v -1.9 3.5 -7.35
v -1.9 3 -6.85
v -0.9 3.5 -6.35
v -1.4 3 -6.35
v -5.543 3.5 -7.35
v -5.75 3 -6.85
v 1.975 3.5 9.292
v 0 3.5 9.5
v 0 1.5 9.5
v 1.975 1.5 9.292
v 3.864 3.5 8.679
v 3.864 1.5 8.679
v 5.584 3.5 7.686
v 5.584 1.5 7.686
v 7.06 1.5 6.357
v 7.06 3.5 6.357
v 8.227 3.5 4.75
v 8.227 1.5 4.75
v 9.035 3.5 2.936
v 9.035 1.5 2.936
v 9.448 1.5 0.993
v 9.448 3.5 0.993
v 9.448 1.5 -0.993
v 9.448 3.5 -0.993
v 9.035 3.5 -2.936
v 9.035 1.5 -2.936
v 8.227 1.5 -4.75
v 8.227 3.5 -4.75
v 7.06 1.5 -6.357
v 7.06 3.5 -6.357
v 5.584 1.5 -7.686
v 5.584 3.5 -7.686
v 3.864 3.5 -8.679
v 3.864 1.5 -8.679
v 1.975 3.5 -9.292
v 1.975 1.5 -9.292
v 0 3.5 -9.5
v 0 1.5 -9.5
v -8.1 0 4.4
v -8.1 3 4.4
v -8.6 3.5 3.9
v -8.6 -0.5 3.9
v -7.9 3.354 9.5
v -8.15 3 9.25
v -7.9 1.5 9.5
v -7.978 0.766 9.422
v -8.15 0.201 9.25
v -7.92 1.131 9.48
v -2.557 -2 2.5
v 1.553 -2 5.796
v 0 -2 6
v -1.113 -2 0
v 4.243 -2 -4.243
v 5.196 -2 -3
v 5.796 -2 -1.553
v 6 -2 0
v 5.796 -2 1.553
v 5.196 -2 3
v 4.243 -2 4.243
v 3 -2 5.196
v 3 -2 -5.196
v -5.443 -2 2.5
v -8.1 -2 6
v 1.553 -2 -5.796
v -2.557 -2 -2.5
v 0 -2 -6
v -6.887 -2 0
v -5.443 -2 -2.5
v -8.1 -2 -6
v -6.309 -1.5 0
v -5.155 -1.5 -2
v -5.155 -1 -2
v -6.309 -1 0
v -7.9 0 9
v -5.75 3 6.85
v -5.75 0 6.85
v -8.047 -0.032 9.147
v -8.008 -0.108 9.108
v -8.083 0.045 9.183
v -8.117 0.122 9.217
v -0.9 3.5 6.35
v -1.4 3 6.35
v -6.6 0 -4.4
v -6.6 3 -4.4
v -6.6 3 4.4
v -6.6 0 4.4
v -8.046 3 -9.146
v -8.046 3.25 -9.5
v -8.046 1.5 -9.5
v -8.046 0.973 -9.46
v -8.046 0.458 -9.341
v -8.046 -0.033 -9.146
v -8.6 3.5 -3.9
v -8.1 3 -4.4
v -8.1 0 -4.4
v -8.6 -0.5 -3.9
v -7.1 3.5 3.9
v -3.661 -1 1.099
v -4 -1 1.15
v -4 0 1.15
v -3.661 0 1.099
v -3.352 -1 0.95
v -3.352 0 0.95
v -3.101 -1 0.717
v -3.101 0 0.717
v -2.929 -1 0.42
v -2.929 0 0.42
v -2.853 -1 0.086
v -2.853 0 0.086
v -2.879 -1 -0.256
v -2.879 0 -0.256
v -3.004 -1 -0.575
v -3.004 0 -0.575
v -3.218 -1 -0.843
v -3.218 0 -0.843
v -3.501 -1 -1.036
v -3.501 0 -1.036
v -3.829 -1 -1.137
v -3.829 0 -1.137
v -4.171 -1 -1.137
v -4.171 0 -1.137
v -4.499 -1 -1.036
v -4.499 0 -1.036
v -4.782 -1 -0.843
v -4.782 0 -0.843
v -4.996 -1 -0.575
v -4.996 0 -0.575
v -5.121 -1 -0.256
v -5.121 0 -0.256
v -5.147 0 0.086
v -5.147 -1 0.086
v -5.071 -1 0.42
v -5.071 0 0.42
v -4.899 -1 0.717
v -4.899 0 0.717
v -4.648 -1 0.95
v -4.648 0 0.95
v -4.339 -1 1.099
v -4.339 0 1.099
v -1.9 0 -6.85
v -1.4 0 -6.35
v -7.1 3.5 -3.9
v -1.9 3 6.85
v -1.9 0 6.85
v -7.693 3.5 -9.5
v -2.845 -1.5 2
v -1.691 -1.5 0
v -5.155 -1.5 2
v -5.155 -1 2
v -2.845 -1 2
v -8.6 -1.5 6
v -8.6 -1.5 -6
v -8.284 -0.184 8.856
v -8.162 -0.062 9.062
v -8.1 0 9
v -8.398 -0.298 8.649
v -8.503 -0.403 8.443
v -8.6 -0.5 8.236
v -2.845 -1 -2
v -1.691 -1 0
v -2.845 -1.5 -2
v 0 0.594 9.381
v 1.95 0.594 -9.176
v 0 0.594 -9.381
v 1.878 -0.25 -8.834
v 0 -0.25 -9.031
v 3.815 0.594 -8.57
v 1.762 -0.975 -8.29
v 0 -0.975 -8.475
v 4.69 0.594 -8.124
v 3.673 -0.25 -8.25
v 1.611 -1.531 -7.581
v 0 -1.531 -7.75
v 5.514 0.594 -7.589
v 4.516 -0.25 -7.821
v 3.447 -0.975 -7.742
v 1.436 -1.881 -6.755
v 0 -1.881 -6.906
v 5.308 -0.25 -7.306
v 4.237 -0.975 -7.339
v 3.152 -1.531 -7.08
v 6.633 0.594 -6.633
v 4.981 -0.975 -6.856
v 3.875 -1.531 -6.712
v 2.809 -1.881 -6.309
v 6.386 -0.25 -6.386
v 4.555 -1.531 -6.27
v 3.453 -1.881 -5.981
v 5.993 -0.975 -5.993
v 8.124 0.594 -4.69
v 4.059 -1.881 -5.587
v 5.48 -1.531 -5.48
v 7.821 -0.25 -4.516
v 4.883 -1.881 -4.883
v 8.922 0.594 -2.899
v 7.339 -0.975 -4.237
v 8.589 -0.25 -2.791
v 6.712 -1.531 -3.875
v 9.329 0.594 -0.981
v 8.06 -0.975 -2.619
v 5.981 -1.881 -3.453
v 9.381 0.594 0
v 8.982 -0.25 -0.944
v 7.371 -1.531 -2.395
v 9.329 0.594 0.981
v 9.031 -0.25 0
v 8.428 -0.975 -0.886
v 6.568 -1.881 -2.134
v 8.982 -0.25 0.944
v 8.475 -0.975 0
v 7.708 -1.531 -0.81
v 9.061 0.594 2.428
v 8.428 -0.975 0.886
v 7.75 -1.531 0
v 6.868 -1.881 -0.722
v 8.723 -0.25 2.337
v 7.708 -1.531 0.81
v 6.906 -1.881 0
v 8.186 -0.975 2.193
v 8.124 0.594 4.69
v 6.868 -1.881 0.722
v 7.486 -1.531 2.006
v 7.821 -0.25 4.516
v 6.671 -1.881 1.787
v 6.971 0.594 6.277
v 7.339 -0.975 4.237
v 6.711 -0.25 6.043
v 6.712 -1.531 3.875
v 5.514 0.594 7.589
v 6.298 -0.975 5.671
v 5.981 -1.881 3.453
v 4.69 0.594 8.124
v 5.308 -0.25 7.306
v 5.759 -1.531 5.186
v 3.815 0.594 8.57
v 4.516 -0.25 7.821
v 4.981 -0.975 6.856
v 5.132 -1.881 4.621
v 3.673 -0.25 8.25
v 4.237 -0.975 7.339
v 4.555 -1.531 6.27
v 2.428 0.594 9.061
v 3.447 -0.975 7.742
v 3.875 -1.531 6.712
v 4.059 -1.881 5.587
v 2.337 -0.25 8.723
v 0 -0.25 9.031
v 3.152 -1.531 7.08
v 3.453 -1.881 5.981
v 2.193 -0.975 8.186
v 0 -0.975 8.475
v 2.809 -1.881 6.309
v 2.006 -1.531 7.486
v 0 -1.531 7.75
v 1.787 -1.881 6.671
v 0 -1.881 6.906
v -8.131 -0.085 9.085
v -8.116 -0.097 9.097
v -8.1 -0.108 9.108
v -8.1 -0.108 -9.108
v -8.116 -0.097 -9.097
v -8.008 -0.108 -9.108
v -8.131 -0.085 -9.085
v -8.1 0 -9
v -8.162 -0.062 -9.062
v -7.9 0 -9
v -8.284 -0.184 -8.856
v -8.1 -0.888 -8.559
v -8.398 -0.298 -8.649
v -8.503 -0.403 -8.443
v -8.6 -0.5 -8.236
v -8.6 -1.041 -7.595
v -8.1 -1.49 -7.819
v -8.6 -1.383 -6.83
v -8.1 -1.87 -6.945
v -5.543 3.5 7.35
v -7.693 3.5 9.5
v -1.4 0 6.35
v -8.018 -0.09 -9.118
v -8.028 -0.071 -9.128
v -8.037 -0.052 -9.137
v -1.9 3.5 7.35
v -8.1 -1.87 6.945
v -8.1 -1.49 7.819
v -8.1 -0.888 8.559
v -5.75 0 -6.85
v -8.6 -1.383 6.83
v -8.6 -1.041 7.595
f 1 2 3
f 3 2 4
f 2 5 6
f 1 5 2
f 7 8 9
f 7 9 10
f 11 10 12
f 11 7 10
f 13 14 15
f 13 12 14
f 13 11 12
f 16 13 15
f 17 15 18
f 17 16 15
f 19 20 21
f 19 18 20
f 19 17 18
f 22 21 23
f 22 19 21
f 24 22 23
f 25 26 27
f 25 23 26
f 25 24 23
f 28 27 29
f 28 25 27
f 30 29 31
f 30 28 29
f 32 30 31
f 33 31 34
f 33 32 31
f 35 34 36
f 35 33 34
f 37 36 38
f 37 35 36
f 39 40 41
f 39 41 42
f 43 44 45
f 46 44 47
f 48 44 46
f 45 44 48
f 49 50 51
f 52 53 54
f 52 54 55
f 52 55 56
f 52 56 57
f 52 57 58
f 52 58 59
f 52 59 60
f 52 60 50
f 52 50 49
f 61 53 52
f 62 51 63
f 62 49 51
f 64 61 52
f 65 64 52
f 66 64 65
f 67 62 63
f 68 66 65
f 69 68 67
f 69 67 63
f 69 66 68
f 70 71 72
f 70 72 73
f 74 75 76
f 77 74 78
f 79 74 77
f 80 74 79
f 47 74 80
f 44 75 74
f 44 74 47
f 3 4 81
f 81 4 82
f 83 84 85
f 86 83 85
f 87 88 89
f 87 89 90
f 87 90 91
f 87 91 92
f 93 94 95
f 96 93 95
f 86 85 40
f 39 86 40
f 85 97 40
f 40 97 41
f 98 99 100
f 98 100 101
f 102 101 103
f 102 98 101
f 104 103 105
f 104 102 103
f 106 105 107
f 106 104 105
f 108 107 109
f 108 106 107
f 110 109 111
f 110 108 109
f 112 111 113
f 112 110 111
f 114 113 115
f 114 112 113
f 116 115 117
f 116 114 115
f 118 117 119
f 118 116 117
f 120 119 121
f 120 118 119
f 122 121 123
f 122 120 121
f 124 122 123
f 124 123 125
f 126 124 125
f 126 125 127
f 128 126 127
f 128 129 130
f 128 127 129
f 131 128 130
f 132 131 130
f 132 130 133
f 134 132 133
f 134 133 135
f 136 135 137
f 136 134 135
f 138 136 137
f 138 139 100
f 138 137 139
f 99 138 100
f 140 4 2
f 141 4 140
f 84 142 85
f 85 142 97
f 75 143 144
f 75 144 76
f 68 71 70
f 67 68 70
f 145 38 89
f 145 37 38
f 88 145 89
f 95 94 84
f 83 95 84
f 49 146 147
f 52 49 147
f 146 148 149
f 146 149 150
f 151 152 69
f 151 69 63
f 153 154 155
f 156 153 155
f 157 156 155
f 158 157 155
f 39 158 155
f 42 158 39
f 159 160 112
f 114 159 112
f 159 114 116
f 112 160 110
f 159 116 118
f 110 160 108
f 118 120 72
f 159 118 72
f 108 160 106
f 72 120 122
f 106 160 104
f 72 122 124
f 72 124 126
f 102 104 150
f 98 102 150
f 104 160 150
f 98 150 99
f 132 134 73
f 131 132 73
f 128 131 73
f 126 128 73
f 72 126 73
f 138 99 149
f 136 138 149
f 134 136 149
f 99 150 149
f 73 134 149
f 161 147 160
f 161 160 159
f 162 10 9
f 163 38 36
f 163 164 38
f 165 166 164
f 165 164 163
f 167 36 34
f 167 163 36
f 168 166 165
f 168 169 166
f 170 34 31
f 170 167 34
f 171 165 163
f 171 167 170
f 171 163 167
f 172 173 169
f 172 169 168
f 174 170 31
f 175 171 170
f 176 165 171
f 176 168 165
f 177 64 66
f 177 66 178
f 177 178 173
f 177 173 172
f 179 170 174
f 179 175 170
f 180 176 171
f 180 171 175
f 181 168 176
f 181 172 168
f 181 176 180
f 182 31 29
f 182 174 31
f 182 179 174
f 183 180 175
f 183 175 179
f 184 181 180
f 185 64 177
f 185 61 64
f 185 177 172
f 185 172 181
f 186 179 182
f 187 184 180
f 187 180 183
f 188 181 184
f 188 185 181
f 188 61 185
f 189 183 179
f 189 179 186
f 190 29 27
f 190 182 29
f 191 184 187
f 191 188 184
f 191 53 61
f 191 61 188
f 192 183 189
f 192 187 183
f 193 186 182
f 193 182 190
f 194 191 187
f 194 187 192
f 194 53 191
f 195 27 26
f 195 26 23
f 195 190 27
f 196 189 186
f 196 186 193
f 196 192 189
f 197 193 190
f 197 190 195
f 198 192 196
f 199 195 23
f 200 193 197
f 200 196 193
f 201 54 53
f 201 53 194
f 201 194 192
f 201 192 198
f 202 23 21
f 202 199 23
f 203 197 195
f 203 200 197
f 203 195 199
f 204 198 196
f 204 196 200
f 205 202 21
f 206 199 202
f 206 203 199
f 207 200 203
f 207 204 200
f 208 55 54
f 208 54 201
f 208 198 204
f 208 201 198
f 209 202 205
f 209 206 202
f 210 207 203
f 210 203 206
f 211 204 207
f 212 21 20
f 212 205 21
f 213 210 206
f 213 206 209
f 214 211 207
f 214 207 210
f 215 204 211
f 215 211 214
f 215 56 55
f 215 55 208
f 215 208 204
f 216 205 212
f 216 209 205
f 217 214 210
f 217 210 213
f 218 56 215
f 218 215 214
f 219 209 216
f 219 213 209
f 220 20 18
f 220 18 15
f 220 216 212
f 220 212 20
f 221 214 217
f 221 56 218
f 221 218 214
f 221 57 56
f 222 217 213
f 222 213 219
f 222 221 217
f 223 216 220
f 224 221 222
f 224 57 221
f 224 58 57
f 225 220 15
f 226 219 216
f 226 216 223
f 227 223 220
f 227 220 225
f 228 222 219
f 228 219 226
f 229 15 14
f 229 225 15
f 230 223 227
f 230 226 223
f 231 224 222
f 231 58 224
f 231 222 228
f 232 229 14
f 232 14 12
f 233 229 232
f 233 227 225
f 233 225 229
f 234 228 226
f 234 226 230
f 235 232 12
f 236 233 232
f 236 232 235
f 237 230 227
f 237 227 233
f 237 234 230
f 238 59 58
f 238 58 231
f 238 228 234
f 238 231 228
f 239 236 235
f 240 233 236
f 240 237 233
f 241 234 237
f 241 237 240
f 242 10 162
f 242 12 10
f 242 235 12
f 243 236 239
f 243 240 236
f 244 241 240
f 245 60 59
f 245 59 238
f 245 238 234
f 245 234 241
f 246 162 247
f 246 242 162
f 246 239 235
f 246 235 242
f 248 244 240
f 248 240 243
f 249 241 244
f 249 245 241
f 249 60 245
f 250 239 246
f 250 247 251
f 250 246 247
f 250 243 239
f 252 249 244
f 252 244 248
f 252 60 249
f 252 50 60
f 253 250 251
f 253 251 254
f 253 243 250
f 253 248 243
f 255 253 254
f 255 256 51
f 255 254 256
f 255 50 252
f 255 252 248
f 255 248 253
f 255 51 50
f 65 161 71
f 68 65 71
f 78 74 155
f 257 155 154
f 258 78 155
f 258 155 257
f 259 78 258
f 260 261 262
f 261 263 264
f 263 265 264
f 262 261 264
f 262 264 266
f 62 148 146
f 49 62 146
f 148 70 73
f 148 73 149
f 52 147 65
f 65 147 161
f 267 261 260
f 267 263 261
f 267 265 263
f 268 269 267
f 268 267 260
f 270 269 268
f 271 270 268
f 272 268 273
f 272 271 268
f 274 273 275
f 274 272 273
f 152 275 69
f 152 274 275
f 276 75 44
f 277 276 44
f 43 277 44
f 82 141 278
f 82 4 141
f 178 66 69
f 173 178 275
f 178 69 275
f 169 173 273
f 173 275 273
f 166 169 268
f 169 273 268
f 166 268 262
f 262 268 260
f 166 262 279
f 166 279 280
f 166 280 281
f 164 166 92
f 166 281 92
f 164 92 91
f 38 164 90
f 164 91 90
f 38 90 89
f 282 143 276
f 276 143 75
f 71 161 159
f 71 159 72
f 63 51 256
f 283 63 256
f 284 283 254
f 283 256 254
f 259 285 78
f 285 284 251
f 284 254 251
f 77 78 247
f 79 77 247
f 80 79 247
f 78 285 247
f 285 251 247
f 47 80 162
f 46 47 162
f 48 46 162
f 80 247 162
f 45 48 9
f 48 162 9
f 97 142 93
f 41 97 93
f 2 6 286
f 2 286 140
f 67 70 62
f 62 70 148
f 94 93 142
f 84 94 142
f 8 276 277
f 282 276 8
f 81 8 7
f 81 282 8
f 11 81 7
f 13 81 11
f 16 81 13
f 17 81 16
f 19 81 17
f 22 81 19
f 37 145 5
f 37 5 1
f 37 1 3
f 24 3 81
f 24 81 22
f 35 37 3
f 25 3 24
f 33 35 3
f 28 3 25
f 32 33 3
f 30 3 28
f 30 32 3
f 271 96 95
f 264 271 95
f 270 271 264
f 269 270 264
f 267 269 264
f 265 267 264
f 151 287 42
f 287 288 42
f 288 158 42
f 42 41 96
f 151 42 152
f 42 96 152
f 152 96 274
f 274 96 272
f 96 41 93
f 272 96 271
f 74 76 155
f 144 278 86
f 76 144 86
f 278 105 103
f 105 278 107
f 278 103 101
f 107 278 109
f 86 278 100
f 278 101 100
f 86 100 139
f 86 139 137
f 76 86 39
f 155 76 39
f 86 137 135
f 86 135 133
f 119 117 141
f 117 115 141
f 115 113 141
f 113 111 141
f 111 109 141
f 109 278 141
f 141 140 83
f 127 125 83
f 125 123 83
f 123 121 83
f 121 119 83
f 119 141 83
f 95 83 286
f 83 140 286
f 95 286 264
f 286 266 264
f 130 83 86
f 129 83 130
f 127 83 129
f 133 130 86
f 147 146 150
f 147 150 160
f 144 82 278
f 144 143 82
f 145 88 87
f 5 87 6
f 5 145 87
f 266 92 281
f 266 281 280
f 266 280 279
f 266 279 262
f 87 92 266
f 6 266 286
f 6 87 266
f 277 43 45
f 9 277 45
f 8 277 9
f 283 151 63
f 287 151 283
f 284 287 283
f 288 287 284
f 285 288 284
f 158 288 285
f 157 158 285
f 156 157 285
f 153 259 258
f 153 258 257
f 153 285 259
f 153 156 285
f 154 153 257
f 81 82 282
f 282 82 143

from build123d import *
from OCP.BRepFilletAPI import BRepFilletAPI_MakeChamfer

# Parameters (mm, degrees)
BOSS_EXTRUDE1_DEPTH     = 2
BOSS_EXTRUDE2_START     = 3.5
BOSS_EXTRUDE2_DEPTH     = 3.5
CUT_EXTRUDE1_DEPTH      = 14.883443377
CUT_EXTRUDE1_DEPTH_BACK = 14.883443377
SKETCH4_R               = 1.15
CUT_EXTRUDE2_DEPTH      = 1
CHAMFER1_SIZE           = 0.5
CHAMFER1_SIZE2          = 0.353553391
FILLET1_R               = 3.5
CHAMFER2_SIZE           = 0.5


with BuildPart() as part:
    # Sketch1 → Boss-Extrude1 (new body)
    with BuildSketch(Plane(origin=(0, 0, 0), x_dir=(1, 0, 0), z_dir=(0, 1, 0))):
        with BuildLine():
            Line((-8.6, -4.5), (-8.6, 4.5))
            Line((-8.6, 4.5), (-8.6, 9.5))
            Line((-8.6, 9.5), (0, 9.5))
            ThreePointArc((0, 9.5), (9.5, 0), (0, -9.5))
            Line((0, -9.5), (-8.6, -9.5))
            Line((-8.6, -9.5), (-8.6, -4.5))
        make_face()
    extrude(amount=-BOSS_EXTRUDE1_DEPTH)

    # Sketch2 → Boss-Extrude2 (add)
    with BuildSketch(Plane(origin=(0, 0, 0), x_dir=(1, 0, 0), z_dir=(0, 1, 0)).offset(BOSS_EXTRUDE2_START)):
        Polygon((-8.6, 4.4), (-6.6, 4.4), (-6.6, -4.4), (-8.6, -4.4), (-8.6, 0), align=None)
        with BuildLine():
            Line((-8.4, 9.5), (-5.75, 6.85))
            Line((-5.75, 6.85), (-1.4, 6.85))
            Line((-1.4, 6.85), (-1.4, -6.85))
            Line((-1.4, -6.85), (-5.75, -6.85))
            Line((-5.75, -6.85), (-8.4, -9.5))
            Line((-8.4, -9.5), (0, -9.5))
            ThreePointArc((0, -9.5), (9.5, 0), (0, 9.5))
            Line((0, 9.5), (-8.4, 9.5))
        make_face()
    extrude(amount=-BOSS_EXTRUDE2_DEPTH)

    # Sketch4 → Cut-Extrude1 (cut, two sides: drawn at the far end of the back side and taken through both)
    with BuildSketch(Plane(origin=(0, 0, 0), x_dir=(1, 0, 0), z_dir=(0, 1, 0)).offset(-CUT_EXTRUDE1_DEPTH_BACK)):
        with Locations(Location((-4, 0, 0), (0, 0, 270))):
            Circle(SKETCH4_R)
    extrude(amount=CUT_EXTRUDE1_DEPTH + CUT_EXTRUDE1_DEPTH_BACK, mode=Mode.SUBTRACT)

    # Sketch14 → Cut-Extrude2 (cut)
    with BuildSketch(Plane.XZ.offset(2)):
        Polygon((-5.154700538, 2), (-2.845299462, 2), (-1.690598923, 0), (-2.845299462, -2), (-5.154700538, -2), (-6.309401077, 0), align=None)
    extrude(amount=-CUT_EXTRUDE2_DEPTH, mode=Mode.SUBTRACT)

    # Chamfer1: one chamfer whose edges measure the first distance from different faces: ONE call of the kernel's chamfer builder (chamfer() names one face for all edges)
    chamfer1_edges_1 = [part.edges().sort_by_distance(p)[0] for p in [
        (-8.6, 0, 6.95),
        (-8.6, 1.75, -4.4),
        (-8.6, 1.75, 4.4),
        (-7.6, 3.5, 4.4),
        (-6.6, 3.5, 0),
        (-7.6, 3.5, -4.4),
        (-8.5, 0, -9.5),
        (-1.4, 1.75, -6.85),
        (-1.4, 1.75, 6.85),
        (-7.075, 3.5, -8.175),
        (-3.575, 3.5, -6.85),
        (-1.4, 3.5, 0),
        (-3.575, 3.5, 6.85),
        (-7.075, 3.5, 8.175),
        (-5.732050808, -2, 1),
        (-5.732050808, -2, -1),
        (-4, -2, -2),
        (-2.267949192, -2, -1),
        (-2.267949192, -2, 1),
        (-4, -2, 2),
        (-8.5, 0, 9.5),
        (-8.6, 0, -6.95),
    ]]
    chamfer1_edges_2 = [part.edges().sort_by_distance(p)[0] for p in [
        (-8.4, 1.75, -9.5),
    ]]
    chamfer1_side_2 = [part.faces().sort_by_distance(p)[0] for p in [
        (-7.075, 1.75, -8.175),
    ]]
    chamfer1_edges_3 = [part.edges().sort_by_distance(p)[0] for p in [
        (-8.4, 1.75, 9.5),
    ]]
    chamfer1_side_3 = [part.faces().sort_by_distance(p)[0] for p in [
        (-4.236909871, 0.734978541, 9.5),
    ]]
    chamfer1 = BRepFilletAPI_MakeChamfer(part.part.solid().wrapped)
    for e in chamfer1_edges_1:
        chamfer1.Add(CHAMFER1_SIZE, e.wrapped)
    for e in chamfer1_edges_2:
        chamfer1.Add(CHAMFER1_SIZE, CHAMFER1_SIZE2, e.wrapped, chamfer1_side_2[0].wrapped)  # the first distance lies on this face
    for e in chamfer1_edges_3:
        chamfer1.Add(CHAMFER1_SIZE, CHAMFER1_SIZE2, e.wrapped, chamfer1_side_3[0].wrapped)  # the first distance lies on this face
    add(Compound.cast(chamfer1.Shape()), mode=Mode.REPLACE)

    # Fillet1
    # the kernel refuses this fillet: 3.5 mm, written as the material it takes off along each edge
    with BuildSketch(Plane(origin=(0, -2, 9.5), x_dir=(0, 1, 0), z_dir=(-1, 0, 0))) as fillet1_piece_1:
        with BuildLine():
            CenterArc((FILLET1_R, FILLET1_R), FILLET1_R, 180, 90)
            Line((0, FILLET1_R), (0, 0))
            Line((0, 0), (FILLET1_R, 0))
        make_face()
    extrude(amount=17.35, mode=Mode.SUBTRACT)
    with BuildSketch(Plane(origin=(-17.35, -2, -9.5), x_dir=(0, 0, 1), z_dir=(1, 0, 0))) as fillet1_piece_2:
        with BuildLine():
            CenterArc((FILLET1_R, -FILLET1_R), FILLET1_R, 90, 90)
            Line((0, -FILLET1_R), (0, 0))
            Line((0, 0), (FILLET1_R, 0))
        make_face()
    extrude(amount=17.35, mode=Mode.SUBTRACT)
    with BuildSketch(Plane(origin=(0, -2, 0), x_dir=(0, 0, -1), z_dir=(-1, 0, 0))) as fillet1_piece_3:
        with BuildLine():
            CenterArc((9.5 - FILLET1_R, -FILLET1_R), FILLET1_R, 0, 90)
            Line((9.5, -FILLET1_R), (9.5, 0))
            Line((9.5, 0), (9.5 - FILLET1_R, 0))
        make_face()
    revolve(axis=Axis((0, -2, 0), (0, -1, 0)), revolution_arc=180, mode=Mode.SUBTRACT)

    # Chamfer2
    chamfer2_edges = [part.edges().sort_by_distance(p)[0] for p in [
        (-8.6, -1.602418411, -7.620185175),
        (-8.6, -1.602418411, 7.620185175),
        (-8.6, -2, 0),
    ]]
    chamfer(chamfer2_edges, length=CHAMFER2_SIZE)


solid = part.part
